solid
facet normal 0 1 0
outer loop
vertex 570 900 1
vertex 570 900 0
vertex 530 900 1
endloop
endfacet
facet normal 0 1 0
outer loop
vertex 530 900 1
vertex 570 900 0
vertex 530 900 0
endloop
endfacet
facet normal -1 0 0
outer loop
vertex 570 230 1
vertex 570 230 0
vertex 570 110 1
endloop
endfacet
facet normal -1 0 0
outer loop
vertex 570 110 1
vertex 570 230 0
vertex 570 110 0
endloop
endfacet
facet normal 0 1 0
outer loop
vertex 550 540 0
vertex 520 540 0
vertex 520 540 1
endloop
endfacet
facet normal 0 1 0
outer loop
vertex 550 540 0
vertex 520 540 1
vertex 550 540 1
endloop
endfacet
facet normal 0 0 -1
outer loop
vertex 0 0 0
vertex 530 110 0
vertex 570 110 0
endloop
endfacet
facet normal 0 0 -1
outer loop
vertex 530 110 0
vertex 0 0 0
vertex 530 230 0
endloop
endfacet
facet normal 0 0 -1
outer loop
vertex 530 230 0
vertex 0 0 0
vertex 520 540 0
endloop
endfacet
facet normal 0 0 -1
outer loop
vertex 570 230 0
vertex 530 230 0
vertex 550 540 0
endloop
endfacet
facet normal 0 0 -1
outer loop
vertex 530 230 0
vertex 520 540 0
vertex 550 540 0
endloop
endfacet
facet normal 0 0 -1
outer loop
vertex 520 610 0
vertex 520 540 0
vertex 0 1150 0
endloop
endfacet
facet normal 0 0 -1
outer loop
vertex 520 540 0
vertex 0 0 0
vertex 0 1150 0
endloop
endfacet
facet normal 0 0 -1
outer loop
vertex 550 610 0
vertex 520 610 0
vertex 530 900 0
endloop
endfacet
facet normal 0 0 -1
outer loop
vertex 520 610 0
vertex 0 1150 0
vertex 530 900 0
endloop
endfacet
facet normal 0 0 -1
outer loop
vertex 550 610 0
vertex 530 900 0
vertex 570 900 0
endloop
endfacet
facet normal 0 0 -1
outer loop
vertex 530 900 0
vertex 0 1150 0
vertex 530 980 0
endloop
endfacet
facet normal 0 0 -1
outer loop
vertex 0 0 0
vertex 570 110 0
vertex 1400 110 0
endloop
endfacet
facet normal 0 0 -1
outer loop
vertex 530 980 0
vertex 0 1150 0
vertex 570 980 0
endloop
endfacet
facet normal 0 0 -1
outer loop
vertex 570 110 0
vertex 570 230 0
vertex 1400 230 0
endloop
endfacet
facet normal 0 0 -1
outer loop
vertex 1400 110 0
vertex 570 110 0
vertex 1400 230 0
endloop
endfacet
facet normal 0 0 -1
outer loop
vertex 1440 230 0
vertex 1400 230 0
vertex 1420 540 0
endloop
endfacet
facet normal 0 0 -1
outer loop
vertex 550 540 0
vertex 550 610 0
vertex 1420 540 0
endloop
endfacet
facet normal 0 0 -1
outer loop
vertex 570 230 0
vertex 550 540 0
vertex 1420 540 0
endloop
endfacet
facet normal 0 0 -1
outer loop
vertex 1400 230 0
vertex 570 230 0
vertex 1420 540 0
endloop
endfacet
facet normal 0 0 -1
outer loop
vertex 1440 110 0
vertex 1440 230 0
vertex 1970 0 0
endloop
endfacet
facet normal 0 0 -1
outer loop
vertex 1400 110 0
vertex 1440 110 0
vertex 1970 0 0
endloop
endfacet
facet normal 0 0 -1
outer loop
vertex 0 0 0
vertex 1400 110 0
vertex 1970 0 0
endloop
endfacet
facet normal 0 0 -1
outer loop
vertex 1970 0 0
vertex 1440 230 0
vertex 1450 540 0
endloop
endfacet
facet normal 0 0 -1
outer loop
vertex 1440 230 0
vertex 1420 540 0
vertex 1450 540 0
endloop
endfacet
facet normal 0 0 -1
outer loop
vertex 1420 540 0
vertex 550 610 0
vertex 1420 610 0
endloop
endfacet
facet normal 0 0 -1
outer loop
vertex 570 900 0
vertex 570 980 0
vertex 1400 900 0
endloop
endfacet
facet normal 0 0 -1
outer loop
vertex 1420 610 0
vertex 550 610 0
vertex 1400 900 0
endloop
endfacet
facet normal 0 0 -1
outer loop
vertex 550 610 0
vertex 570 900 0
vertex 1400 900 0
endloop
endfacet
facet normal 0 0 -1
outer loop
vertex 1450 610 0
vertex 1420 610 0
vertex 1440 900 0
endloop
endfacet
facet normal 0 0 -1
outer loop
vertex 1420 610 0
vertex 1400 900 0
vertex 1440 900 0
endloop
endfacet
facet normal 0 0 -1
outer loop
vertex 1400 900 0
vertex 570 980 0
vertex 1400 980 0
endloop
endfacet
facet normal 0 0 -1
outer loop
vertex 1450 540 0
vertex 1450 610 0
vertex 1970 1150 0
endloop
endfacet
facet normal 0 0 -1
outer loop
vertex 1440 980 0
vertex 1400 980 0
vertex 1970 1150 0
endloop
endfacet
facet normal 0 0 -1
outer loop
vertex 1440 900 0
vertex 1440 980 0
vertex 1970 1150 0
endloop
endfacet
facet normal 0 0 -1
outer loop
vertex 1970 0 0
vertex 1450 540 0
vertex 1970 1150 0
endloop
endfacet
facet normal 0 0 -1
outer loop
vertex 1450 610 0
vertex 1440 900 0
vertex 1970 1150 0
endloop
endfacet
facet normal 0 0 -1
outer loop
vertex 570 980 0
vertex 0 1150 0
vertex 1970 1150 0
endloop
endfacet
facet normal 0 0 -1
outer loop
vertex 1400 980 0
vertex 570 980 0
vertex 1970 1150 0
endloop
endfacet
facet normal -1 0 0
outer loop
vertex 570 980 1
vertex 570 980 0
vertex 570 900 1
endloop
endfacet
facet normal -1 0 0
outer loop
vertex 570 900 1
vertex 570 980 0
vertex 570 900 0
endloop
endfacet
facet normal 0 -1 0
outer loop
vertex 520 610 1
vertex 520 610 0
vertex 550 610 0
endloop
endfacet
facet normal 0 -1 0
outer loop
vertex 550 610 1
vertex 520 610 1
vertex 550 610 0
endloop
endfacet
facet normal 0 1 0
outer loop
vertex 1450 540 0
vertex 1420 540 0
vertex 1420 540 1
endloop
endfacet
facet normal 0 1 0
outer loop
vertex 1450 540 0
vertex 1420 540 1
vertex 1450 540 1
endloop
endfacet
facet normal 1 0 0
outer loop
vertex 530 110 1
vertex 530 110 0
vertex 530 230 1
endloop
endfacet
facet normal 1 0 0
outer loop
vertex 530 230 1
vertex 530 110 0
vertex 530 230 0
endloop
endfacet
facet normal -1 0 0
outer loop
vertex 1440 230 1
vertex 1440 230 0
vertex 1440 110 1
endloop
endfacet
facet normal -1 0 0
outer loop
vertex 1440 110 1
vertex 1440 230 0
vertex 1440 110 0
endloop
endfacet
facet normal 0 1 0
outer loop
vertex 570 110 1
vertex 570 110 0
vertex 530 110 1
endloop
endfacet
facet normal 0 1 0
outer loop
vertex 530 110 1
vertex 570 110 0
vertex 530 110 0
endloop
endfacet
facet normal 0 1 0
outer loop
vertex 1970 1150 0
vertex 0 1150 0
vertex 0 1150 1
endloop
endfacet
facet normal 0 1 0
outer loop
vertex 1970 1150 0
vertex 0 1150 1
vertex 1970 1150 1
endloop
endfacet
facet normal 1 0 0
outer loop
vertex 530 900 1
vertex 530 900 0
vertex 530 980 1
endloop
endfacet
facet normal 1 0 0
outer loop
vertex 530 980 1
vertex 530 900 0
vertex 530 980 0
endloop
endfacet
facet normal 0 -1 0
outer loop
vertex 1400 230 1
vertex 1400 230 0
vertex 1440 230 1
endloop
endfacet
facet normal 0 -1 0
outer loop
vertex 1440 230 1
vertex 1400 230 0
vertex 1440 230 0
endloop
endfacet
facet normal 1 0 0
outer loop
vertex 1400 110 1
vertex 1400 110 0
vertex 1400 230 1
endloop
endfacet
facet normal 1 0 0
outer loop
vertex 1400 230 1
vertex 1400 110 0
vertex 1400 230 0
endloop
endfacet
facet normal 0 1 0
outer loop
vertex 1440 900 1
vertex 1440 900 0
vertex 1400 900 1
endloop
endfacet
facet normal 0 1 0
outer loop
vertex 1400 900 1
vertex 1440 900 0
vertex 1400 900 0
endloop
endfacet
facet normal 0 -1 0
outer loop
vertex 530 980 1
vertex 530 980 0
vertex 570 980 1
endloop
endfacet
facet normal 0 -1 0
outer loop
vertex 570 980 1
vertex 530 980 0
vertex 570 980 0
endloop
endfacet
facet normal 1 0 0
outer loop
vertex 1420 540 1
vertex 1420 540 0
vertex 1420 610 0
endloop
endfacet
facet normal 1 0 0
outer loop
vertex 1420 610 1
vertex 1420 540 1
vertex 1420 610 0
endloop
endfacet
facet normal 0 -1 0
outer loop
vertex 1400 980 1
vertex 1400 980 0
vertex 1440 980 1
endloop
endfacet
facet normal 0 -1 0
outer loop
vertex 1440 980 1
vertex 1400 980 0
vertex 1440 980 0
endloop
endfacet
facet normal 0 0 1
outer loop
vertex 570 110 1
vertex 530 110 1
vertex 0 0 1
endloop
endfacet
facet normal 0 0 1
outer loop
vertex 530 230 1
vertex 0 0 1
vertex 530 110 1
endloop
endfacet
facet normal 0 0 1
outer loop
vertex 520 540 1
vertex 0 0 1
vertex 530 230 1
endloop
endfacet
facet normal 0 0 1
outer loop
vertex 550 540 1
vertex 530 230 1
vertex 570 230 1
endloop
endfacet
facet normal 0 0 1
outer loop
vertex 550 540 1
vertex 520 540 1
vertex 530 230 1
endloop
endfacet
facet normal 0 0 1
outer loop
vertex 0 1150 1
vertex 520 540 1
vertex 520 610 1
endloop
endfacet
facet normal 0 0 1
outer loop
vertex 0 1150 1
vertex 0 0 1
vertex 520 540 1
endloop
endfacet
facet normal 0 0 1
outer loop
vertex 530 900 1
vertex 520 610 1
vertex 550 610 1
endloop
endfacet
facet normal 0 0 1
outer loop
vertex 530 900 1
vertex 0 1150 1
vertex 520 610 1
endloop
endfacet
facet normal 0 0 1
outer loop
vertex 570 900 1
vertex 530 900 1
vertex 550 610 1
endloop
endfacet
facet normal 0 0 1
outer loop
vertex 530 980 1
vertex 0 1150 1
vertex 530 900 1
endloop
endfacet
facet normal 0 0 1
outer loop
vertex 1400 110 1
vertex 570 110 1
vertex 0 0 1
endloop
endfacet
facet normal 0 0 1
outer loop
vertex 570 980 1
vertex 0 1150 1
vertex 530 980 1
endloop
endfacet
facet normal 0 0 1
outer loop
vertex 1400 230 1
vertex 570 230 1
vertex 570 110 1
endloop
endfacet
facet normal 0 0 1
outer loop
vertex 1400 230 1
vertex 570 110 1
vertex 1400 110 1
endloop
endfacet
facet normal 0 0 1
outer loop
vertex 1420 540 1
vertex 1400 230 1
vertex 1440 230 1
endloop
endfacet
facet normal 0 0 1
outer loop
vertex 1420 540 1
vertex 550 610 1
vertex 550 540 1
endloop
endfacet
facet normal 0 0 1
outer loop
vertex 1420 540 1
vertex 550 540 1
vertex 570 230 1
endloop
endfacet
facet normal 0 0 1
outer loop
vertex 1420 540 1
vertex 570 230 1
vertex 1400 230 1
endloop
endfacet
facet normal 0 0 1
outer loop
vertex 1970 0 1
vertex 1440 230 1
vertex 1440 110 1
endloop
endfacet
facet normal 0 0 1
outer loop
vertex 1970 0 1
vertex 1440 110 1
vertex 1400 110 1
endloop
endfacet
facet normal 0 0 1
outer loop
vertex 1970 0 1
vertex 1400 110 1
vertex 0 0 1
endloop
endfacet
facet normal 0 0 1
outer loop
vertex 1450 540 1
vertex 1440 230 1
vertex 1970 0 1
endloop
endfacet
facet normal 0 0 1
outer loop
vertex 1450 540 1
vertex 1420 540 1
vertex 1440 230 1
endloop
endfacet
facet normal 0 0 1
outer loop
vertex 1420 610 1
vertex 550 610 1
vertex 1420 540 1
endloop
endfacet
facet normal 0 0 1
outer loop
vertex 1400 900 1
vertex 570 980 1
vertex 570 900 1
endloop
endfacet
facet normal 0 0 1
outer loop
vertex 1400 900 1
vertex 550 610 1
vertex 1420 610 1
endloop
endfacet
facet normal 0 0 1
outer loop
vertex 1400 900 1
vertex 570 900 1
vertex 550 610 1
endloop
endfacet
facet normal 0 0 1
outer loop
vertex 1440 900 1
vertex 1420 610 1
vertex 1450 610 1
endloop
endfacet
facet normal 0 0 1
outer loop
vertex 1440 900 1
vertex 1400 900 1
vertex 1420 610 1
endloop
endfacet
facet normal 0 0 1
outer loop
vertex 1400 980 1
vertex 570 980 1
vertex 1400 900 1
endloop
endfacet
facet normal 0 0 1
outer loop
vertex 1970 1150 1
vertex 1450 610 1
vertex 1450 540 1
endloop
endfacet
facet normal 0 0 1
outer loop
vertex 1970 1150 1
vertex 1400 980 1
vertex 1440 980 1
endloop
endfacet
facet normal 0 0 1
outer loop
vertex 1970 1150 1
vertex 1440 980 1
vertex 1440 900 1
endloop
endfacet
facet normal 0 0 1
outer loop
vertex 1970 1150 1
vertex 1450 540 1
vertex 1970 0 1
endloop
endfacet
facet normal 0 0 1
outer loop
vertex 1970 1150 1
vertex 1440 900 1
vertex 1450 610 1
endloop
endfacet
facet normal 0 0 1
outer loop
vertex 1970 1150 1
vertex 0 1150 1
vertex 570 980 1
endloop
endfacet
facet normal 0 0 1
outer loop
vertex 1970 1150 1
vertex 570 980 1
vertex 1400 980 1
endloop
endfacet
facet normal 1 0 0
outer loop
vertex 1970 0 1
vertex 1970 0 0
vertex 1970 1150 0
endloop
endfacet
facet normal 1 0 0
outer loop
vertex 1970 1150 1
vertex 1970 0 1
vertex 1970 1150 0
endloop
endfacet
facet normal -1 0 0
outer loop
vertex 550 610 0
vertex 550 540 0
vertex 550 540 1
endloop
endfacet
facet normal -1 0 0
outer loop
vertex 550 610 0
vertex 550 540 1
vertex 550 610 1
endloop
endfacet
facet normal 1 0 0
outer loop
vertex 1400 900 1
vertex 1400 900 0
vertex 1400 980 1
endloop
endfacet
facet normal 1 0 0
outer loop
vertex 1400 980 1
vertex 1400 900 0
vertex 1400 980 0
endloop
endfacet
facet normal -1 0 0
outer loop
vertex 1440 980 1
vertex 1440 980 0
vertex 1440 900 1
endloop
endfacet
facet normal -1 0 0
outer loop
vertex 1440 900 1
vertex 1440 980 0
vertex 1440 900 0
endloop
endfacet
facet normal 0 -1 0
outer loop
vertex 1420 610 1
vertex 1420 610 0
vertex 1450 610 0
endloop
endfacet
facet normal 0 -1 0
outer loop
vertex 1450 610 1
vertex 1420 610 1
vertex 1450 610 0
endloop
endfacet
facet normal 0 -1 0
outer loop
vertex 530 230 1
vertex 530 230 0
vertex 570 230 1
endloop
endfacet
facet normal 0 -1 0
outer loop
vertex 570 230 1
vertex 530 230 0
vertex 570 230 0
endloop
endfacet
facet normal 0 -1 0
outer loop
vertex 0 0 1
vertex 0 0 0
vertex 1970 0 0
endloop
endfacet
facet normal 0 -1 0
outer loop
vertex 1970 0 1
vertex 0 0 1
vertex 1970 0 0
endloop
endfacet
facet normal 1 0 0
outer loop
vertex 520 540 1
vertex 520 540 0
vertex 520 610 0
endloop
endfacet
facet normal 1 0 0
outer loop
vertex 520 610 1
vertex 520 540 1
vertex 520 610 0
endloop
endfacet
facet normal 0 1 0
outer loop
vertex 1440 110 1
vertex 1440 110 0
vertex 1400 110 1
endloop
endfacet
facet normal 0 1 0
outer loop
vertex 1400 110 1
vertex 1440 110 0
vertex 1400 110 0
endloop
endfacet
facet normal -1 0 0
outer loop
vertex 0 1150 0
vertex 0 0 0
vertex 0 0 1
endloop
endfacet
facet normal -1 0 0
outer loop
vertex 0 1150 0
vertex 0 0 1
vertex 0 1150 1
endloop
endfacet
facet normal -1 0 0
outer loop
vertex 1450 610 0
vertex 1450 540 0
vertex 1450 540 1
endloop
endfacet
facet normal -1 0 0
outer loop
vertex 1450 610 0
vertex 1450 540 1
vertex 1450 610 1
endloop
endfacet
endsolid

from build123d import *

# Parameters (mm, degrees)
F0_W     = 1970
F0_H     = 1150
F0_W_2   = 30
F0_H_2   = 70
F1_DEPTH = 1


with BuildPart() as f1:
    # F0 (on Top) → F1 (new body)
    with BuildSketch(Plane.XY):
        with Locations((985, 575)):
            Rectangle(F0_W, F0_H)
        Polygon((570, 110), (550, 110), (530, 110), (530, 230), (550, 230), (570, 230), align=None, mode=Mode.SUBTRACT)
        Polygon((1420, 230), (1440, 230), (1440, 110), (1420, 110), (1400, 110), (1400, 230), align=None, mode=Mode.SUBTRACT)
        with Locations((535, 575)):
            Rectangle(F0_W_2, F0_H_2, mode=Mode.SUBTRACT)
        Polygon((570, 900), (550, 900), (530, 900), (530, 980), (550, 980), (570, 980), align=None, mode=Mode.SUBTRACT)
        with Locations((1435, 575)):
            Rectangle(F0_W_2, F0_H_2, mode=Mode.SUBTRACT)
        Polygon((1440, 980), (1440, 900), (1420, 900), (1400, 900), (1400, 980), (1420, 980), align=None, mode=Mode.SUBTRACT)
    extrude(amount=F1_DEPTH)


solid = f1.part
